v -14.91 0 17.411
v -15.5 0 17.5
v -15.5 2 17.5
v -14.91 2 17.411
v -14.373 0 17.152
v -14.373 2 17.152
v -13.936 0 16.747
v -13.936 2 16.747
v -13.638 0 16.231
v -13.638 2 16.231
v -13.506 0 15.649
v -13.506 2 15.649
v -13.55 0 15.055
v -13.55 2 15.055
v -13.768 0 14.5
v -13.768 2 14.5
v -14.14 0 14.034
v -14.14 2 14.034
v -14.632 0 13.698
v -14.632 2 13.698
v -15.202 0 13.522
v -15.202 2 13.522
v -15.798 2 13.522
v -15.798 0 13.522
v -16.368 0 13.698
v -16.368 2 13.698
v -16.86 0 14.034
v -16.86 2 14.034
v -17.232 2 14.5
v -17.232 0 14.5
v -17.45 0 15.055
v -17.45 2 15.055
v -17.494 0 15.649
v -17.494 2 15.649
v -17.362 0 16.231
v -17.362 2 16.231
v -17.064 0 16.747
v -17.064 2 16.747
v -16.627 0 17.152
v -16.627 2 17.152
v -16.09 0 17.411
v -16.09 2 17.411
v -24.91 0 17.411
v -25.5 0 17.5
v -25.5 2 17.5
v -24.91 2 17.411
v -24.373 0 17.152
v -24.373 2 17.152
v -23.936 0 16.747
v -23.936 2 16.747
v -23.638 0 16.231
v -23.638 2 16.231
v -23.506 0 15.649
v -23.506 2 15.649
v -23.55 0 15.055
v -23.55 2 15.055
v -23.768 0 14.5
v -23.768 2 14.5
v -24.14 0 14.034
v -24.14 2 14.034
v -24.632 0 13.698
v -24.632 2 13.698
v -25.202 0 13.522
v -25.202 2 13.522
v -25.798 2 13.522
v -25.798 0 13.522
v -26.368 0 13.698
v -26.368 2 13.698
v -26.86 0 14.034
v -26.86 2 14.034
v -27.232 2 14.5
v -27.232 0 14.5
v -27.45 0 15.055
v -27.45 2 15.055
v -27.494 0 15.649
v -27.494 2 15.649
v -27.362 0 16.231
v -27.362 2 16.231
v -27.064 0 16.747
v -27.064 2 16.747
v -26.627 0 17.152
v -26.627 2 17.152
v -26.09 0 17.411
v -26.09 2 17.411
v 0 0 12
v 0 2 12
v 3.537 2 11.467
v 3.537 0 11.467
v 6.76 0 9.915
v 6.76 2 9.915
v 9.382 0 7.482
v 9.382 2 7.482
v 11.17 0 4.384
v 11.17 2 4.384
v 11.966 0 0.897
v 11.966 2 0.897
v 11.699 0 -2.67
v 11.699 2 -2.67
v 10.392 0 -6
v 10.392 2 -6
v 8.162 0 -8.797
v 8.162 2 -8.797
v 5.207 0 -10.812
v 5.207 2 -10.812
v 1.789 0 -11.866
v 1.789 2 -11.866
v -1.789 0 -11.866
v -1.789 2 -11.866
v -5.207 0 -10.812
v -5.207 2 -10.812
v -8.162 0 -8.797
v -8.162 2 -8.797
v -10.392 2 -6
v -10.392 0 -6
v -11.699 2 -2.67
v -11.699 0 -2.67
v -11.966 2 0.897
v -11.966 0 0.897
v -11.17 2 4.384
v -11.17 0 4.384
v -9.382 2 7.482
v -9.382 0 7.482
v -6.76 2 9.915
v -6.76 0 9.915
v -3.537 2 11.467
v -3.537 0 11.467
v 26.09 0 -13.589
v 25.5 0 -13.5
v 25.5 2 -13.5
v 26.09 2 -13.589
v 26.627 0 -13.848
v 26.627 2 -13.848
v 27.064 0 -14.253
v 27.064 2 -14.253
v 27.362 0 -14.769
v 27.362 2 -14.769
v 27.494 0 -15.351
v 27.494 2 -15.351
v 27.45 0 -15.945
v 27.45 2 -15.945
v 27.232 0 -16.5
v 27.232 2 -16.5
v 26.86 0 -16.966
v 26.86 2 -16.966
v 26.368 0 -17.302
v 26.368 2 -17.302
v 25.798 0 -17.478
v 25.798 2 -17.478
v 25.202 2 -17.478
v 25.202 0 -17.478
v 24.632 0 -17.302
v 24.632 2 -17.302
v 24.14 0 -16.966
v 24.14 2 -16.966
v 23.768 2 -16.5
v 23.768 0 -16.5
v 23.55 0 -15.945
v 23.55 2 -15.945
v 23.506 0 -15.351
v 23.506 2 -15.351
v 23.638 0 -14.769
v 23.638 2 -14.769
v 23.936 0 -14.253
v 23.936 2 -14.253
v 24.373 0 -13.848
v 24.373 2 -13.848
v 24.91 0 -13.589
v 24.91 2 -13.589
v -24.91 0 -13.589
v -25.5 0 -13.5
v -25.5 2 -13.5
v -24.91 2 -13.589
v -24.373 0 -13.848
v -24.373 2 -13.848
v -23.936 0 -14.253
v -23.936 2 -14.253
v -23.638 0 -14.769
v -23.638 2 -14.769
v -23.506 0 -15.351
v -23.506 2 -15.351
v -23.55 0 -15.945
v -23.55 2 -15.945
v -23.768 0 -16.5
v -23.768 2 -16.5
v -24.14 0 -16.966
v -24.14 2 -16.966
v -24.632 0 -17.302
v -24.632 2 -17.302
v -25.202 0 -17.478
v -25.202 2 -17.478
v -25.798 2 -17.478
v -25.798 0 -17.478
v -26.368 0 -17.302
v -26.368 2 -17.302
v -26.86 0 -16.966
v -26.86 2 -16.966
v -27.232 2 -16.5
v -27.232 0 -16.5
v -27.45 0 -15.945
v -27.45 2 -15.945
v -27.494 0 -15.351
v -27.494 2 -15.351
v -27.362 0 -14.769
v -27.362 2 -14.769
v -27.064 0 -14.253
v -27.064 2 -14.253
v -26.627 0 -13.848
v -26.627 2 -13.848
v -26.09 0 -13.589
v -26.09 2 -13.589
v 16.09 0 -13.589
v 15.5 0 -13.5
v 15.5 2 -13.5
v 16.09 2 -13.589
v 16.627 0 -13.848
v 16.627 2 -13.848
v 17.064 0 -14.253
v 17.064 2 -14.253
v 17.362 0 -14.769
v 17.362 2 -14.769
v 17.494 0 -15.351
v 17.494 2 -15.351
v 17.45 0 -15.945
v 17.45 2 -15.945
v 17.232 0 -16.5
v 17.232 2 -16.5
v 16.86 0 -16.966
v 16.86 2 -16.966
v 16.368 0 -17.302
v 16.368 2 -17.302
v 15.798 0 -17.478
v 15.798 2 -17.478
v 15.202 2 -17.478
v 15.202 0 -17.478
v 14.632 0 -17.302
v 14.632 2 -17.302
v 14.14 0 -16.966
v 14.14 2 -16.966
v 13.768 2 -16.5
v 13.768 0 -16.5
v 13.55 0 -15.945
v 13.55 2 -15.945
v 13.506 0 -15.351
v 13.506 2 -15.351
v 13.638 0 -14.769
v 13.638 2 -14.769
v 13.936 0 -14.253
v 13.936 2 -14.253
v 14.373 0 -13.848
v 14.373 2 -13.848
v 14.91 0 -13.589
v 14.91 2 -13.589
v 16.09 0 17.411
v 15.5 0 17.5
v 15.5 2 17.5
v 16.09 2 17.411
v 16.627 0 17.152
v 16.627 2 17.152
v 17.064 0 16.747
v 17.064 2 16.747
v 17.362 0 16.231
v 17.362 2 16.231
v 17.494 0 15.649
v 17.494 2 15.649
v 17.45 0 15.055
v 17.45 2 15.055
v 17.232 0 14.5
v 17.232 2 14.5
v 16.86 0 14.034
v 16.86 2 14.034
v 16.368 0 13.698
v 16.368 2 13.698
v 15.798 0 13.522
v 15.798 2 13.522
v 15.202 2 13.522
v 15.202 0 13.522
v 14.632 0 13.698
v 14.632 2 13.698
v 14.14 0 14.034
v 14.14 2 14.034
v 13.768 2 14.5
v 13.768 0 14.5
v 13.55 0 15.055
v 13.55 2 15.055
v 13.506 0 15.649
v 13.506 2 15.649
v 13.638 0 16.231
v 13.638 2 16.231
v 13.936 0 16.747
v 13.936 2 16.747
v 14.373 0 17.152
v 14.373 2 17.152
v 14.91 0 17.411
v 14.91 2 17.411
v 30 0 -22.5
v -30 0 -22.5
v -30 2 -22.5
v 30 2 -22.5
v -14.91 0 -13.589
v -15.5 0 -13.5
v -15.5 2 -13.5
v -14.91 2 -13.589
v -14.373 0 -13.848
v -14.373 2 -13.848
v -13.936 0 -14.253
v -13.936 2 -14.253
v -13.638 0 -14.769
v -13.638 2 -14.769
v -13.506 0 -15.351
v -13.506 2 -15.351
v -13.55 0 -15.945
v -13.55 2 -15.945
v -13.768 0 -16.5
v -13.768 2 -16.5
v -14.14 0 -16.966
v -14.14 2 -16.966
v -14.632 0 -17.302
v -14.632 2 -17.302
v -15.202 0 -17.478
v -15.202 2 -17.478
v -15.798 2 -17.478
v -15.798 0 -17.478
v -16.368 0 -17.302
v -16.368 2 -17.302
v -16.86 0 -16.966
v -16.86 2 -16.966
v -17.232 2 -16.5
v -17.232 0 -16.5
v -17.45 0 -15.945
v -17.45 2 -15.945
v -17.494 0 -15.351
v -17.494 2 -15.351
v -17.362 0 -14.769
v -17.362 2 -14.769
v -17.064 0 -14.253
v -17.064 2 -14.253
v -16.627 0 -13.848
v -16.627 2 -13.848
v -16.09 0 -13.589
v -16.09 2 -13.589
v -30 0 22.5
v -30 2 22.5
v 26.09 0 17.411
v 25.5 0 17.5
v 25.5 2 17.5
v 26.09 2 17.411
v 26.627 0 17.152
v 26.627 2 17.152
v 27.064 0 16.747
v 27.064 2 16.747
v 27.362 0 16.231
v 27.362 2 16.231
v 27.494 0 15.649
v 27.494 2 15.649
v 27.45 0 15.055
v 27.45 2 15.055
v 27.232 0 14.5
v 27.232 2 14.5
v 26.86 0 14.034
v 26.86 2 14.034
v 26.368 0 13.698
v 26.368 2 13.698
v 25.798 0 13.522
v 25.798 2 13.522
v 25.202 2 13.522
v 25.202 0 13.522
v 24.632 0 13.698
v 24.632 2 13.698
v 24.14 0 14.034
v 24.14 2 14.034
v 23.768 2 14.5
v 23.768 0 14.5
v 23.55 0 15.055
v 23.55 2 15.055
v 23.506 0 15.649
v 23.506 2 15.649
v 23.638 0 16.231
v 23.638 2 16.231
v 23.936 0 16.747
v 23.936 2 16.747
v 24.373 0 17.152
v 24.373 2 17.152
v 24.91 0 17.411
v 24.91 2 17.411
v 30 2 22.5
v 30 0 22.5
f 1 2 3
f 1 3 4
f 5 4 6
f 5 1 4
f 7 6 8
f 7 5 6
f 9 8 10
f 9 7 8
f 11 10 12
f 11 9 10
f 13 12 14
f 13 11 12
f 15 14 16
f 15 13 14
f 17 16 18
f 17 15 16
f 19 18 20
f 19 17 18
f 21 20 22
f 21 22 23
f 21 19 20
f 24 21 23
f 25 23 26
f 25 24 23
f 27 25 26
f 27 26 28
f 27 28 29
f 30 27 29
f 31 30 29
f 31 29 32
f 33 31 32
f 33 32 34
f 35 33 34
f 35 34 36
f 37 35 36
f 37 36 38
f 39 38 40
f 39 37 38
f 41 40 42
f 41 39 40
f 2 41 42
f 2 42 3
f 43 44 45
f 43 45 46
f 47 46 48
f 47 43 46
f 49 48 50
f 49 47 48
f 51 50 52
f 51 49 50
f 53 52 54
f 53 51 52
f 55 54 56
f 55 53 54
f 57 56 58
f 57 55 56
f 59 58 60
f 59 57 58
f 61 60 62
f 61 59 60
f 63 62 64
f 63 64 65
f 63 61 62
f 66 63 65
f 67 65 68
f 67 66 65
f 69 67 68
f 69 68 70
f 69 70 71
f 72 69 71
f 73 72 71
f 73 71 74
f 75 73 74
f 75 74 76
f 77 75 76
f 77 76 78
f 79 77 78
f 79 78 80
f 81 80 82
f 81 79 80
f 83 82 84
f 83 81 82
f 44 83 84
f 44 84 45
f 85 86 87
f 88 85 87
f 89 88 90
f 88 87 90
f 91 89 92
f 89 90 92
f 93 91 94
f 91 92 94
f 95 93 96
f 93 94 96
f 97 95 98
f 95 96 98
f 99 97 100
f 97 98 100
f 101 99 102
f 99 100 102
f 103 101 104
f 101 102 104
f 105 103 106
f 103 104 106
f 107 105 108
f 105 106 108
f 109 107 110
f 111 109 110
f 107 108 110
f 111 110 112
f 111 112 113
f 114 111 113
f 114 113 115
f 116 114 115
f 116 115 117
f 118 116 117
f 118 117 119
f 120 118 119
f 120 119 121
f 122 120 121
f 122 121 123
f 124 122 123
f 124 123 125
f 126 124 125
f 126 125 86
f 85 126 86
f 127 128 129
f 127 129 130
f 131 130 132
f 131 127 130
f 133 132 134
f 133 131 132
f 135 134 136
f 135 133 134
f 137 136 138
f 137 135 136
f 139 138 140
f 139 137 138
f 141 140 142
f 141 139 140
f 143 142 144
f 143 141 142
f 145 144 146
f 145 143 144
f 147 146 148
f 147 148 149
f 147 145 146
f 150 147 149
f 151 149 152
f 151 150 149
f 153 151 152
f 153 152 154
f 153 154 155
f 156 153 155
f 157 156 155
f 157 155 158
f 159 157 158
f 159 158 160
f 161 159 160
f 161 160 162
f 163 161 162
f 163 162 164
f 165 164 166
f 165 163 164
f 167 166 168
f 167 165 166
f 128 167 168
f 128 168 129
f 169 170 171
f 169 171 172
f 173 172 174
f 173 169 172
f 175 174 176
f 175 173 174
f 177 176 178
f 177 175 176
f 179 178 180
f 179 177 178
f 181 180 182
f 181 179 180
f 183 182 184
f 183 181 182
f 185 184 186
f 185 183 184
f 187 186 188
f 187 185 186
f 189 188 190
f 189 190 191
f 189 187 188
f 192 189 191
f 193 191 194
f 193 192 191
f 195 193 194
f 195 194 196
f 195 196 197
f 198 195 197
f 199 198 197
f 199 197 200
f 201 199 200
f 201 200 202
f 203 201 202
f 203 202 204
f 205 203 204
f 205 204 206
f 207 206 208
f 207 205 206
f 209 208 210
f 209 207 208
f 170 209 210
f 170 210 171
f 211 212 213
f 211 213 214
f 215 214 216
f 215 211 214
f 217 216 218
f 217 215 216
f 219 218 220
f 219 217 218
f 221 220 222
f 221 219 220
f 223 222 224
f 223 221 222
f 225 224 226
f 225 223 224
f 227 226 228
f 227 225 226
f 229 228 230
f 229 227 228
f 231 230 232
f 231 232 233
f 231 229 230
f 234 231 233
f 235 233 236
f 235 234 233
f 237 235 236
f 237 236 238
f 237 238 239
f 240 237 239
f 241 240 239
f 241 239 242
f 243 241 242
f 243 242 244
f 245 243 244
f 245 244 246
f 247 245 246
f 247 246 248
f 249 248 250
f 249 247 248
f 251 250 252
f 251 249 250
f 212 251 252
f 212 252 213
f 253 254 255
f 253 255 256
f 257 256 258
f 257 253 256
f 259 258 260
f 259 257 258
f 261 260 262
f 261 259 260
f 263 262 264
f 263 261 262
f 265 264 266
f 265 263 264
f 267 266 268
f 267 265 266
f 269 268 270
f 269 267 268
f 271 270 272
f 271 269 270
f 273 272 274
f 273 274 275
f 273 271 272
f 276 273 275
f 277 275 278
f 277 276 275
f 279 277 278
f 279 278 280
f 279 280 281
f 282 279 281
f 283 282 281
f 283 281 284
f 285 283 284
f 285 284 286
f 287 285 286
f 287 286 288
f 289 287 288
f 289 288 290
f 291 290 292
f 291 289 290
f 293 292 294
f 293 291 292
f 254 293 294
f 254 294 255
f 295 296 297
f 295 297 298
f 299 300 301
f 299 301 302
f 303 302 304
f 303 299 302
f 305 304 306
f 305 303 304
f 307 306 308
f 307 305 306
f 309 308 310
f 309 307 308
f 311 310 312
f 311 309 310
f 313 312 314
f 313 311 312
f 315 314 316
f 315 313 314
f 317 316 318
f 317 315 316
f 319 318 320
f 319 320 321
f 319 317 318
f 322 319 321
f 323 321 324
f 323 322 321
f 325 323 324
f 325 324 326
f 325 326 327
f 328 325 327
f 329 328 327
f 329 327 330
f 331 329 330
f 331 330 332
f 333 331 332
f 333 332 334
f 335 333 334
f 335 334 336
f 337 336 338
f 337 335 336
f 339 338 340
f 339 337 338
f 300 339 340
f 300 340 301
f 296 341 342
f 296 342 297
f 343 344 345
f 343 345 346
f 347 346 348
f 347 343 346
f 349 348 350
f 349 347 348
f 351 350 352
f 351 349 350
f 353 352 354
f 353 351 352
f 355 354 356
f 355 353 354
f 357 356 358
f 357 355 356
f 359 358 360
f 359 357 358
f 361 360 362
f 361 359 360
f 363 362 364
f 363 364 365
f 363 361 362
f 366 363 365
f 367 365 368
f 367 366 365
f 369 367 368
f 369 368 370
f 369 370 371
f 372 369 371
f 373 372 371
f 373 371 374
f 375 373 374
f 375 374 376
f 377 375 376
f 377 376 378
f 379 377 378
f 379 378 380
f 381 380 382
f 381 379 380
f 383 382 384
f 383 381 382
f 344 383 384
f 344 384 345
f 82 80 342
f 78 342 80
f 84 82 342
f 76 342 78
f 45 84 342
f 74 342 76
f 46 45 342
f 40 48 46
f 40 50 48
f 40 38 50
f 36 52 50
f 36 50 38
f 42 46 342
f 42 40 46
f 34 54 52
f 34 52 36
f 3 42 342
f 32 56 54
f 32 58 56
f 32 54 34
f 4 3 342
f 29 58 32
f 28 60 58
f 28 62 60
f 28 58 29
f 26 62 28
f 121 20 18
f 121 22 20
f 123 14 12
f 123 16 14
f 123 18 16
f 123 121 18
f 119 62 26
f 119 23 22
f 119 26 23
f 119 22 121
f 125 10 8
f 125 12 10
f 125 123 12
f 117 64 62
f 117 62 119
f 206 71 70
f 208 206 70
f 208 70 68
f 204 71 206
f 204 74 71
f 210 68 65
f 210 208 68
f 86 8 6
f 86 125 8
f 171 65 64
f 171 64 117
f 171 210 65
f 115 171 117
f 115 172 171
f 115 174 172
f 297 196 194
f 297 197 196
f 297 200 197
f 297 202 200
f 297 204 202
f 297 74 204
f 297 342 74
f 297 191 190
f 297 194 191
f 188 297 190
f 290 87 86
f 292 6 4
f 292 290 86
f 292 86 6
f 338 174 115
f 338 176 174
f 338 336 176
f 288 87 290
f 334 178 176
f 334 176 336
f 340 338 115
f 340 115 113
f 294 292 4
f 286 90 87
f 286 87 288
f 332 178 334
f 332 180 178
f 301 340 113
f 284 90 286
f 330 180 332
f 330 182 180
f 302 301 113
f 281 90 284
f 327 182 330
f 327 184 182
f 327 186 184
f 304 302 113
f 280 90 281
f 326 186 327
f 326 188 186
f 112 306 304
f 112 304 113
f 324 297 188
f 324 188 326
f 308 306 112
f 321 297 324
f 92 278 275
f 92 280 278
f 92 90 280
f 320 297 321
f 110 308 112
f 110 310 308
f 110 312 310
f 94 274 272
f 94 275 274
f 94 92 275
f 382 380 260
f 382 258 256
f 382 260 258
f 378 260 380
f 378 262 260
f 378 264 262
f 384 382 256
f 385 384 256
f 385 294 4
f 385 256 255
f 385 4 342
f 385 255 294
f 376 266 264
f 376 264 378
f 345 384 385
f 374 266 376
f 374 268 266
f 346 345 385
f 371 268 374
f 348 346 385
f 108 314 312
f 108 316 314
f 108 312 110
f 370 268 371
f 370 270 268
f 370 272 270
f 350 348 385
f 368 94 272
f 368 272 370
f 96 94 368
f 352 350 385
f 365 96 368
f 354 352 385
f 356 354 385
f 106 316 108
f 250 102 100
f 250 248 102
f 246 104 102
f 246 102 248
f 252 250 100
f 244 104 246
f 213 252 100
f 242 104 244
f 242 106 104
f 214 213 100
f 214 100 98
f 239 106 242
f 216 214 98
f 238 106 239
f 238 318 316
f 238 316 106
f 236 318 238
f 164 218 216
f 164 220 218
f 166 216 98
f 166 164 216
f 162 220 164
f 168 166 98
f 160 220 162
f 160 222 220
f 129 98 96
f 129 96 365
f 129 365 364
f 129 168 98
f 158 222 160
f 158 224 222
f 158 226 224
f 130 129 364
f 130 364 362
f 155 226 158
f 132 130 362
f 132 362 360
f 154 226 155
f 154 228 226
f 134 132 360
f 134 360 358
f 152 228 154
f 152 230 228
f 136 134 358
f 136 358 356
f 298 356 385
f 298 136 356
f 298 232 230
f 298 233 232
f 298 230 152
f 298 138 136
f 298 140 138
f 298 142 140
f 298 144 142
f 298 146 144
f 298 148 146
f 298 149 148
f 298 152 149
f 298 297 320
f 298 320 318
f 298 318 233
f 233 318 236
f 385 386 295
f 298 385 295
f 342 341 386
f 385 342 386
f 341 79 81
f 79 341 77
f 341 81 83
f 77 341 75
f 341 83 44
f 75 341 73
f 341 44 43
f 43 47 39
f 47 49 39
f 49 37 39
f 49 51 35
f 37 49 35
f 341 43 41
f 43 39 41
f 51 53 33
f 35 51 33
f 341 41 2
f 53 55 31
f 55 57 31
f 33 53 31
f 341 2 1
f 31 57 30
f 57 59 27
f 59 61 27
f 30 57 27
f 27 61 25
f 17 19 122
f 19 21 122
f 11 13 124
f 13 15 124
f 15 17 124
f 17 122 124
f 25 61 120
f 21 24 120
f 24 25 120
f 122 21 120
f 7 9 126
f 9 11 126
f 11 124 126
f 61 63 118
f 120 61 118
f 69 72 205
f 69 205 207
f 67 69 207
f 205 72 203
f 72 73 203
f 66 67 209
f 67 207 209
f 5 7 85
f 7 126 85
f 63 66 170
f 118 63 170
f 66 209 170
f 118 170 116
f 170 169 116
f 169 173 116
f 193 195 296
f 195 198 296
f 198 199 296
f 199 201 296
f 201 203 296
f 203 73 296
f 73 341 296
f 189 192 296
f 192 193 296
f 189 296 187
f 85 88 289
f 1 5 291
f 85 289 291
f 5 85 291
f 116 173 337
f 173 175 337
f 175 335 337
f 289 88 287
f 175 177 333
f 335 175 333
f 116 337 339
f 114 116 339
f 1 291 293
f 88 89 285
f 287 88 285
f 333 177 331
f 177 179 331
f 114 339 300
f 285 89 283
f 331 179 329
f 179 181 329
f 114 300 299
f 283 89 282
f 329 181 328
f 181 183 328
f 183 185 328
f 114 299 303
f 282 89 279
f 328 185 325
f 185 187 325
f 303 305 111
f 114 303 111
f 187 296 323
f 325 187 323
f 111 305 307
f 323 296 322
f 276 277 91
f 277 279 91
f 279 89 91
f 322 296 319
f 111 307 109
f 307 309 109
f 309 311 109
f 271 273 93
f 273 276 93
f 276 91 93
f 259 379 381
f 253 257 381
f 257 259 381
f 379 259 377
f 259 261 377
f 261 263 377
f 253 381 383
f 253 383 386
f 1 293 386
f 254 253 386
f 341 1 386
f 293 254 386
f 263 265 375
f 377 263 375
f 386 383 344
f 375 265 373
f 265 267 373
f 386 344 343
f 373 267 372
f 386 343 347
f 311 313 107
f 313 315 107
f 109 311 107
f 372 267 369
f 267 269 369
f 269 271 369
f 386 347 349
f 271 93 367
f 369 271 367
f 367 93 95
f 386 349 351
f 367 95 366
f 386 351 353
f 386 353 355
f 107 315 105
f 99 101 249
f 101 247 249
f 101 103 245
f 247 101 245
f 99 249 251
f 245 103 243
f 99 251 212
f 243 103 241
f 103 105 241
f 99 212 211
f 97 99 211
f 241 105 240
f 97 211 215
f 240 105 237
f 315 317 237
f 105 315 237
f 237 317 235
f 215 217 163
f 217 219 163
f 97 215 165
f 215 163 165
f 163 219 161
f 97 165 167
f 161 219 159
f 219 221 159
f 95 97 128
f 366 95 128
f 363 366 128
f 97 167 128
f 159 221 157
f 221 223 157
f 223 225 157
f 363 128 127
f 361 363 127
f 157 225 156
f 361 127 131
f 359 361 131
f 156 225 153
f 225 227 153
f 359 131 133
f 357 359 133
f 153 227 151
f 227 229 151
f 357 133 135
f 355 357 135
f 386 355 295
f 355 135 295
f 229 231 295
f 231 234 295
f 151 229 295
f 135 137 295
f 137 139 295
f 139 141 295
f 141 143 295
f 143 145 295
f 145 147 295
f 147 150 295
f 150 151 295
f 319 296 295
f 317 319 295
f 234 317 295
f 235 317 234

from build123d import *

# Parameters (mm, degrees)
SKETCH1_W           = 60
SKETCH1_H           = 45
SKETCH1_R           = 2
BOSS_EXTRUDE1_DEPTH = 2
SKETCH2_R           = 12
CUT_EXTRUDE1_DEPTH  = 38.553295461


with BuildPart() as part:
    # Sketch1 → Boss-Extrude1 (new body)
    with BuildSketch(Plane(origin=(0, 0, 0), x_dir=(1, 0, 0), z_dir=(0, 1, 0))):
        Rectangle(SKETCH1_W, SKETCH1_H)
        with Locations(Location((-15.5, 15.5, 0), (0, 0, 270))):
            Circle(SKETCH1_R, mode=Mode.SUBTRACT)
        with Locations(Location((15.5, 15.5, 0), (0, 0, 270))):
            Circle(SKETCH1_R, mode=Mode.SUBTRACT)
        with Locations(Location((15.5, -15.5, 0), (0, 0, 270))):
            Circle(SKETCH1_R, mode=Mode.SUBTRACT)
        with Locations(Location((-15.5, -15.5, 0), (0, 0, 270))):
            Circle(SKETCH1_R, mode=Mode.SUBTRACT)
        with Locations(Location((-25.5, 15.5, 0), (0, 0, 270))):
            Circle(SKETCH1_R, mode=Mode.SUBTRACT)
        with Locations(Location((-25.5, -15.5, 0), (0, 0, 270))):
            Circle(SKETCH1_R, mode=Mode.SUBTRACT)
        with Locations(Location((25.5, -15.5, 0), (0, 0, 270))):
            Circle(SKETCH1_R, mode=Mode.SUBTRACT)
        with Locations(Location((25.5, 15.5, 0), (0, 0, 270))):
            Circle(SKETCH1_R, mode=Mode.SUBTRACT)
    extrude(amount=BOSS_EXTRUDE1_DEPTH)

    # Sketch2 → Cut-Extrude1 (cut, through all)
    with BuildSketch(Plane(origin=(0, 2, 0), x_dir=(1, 0, 0), z_dir=(0, 1, 0))):
        with Locations(Location((0, 0, 0), (0, 0, 270))):
            Circle(SKETCH2_R)
    extrude(amount=-CUT_EXTRUDE1_DEPTH, mode=Mode.SUBTRACT)


solid = part.part
